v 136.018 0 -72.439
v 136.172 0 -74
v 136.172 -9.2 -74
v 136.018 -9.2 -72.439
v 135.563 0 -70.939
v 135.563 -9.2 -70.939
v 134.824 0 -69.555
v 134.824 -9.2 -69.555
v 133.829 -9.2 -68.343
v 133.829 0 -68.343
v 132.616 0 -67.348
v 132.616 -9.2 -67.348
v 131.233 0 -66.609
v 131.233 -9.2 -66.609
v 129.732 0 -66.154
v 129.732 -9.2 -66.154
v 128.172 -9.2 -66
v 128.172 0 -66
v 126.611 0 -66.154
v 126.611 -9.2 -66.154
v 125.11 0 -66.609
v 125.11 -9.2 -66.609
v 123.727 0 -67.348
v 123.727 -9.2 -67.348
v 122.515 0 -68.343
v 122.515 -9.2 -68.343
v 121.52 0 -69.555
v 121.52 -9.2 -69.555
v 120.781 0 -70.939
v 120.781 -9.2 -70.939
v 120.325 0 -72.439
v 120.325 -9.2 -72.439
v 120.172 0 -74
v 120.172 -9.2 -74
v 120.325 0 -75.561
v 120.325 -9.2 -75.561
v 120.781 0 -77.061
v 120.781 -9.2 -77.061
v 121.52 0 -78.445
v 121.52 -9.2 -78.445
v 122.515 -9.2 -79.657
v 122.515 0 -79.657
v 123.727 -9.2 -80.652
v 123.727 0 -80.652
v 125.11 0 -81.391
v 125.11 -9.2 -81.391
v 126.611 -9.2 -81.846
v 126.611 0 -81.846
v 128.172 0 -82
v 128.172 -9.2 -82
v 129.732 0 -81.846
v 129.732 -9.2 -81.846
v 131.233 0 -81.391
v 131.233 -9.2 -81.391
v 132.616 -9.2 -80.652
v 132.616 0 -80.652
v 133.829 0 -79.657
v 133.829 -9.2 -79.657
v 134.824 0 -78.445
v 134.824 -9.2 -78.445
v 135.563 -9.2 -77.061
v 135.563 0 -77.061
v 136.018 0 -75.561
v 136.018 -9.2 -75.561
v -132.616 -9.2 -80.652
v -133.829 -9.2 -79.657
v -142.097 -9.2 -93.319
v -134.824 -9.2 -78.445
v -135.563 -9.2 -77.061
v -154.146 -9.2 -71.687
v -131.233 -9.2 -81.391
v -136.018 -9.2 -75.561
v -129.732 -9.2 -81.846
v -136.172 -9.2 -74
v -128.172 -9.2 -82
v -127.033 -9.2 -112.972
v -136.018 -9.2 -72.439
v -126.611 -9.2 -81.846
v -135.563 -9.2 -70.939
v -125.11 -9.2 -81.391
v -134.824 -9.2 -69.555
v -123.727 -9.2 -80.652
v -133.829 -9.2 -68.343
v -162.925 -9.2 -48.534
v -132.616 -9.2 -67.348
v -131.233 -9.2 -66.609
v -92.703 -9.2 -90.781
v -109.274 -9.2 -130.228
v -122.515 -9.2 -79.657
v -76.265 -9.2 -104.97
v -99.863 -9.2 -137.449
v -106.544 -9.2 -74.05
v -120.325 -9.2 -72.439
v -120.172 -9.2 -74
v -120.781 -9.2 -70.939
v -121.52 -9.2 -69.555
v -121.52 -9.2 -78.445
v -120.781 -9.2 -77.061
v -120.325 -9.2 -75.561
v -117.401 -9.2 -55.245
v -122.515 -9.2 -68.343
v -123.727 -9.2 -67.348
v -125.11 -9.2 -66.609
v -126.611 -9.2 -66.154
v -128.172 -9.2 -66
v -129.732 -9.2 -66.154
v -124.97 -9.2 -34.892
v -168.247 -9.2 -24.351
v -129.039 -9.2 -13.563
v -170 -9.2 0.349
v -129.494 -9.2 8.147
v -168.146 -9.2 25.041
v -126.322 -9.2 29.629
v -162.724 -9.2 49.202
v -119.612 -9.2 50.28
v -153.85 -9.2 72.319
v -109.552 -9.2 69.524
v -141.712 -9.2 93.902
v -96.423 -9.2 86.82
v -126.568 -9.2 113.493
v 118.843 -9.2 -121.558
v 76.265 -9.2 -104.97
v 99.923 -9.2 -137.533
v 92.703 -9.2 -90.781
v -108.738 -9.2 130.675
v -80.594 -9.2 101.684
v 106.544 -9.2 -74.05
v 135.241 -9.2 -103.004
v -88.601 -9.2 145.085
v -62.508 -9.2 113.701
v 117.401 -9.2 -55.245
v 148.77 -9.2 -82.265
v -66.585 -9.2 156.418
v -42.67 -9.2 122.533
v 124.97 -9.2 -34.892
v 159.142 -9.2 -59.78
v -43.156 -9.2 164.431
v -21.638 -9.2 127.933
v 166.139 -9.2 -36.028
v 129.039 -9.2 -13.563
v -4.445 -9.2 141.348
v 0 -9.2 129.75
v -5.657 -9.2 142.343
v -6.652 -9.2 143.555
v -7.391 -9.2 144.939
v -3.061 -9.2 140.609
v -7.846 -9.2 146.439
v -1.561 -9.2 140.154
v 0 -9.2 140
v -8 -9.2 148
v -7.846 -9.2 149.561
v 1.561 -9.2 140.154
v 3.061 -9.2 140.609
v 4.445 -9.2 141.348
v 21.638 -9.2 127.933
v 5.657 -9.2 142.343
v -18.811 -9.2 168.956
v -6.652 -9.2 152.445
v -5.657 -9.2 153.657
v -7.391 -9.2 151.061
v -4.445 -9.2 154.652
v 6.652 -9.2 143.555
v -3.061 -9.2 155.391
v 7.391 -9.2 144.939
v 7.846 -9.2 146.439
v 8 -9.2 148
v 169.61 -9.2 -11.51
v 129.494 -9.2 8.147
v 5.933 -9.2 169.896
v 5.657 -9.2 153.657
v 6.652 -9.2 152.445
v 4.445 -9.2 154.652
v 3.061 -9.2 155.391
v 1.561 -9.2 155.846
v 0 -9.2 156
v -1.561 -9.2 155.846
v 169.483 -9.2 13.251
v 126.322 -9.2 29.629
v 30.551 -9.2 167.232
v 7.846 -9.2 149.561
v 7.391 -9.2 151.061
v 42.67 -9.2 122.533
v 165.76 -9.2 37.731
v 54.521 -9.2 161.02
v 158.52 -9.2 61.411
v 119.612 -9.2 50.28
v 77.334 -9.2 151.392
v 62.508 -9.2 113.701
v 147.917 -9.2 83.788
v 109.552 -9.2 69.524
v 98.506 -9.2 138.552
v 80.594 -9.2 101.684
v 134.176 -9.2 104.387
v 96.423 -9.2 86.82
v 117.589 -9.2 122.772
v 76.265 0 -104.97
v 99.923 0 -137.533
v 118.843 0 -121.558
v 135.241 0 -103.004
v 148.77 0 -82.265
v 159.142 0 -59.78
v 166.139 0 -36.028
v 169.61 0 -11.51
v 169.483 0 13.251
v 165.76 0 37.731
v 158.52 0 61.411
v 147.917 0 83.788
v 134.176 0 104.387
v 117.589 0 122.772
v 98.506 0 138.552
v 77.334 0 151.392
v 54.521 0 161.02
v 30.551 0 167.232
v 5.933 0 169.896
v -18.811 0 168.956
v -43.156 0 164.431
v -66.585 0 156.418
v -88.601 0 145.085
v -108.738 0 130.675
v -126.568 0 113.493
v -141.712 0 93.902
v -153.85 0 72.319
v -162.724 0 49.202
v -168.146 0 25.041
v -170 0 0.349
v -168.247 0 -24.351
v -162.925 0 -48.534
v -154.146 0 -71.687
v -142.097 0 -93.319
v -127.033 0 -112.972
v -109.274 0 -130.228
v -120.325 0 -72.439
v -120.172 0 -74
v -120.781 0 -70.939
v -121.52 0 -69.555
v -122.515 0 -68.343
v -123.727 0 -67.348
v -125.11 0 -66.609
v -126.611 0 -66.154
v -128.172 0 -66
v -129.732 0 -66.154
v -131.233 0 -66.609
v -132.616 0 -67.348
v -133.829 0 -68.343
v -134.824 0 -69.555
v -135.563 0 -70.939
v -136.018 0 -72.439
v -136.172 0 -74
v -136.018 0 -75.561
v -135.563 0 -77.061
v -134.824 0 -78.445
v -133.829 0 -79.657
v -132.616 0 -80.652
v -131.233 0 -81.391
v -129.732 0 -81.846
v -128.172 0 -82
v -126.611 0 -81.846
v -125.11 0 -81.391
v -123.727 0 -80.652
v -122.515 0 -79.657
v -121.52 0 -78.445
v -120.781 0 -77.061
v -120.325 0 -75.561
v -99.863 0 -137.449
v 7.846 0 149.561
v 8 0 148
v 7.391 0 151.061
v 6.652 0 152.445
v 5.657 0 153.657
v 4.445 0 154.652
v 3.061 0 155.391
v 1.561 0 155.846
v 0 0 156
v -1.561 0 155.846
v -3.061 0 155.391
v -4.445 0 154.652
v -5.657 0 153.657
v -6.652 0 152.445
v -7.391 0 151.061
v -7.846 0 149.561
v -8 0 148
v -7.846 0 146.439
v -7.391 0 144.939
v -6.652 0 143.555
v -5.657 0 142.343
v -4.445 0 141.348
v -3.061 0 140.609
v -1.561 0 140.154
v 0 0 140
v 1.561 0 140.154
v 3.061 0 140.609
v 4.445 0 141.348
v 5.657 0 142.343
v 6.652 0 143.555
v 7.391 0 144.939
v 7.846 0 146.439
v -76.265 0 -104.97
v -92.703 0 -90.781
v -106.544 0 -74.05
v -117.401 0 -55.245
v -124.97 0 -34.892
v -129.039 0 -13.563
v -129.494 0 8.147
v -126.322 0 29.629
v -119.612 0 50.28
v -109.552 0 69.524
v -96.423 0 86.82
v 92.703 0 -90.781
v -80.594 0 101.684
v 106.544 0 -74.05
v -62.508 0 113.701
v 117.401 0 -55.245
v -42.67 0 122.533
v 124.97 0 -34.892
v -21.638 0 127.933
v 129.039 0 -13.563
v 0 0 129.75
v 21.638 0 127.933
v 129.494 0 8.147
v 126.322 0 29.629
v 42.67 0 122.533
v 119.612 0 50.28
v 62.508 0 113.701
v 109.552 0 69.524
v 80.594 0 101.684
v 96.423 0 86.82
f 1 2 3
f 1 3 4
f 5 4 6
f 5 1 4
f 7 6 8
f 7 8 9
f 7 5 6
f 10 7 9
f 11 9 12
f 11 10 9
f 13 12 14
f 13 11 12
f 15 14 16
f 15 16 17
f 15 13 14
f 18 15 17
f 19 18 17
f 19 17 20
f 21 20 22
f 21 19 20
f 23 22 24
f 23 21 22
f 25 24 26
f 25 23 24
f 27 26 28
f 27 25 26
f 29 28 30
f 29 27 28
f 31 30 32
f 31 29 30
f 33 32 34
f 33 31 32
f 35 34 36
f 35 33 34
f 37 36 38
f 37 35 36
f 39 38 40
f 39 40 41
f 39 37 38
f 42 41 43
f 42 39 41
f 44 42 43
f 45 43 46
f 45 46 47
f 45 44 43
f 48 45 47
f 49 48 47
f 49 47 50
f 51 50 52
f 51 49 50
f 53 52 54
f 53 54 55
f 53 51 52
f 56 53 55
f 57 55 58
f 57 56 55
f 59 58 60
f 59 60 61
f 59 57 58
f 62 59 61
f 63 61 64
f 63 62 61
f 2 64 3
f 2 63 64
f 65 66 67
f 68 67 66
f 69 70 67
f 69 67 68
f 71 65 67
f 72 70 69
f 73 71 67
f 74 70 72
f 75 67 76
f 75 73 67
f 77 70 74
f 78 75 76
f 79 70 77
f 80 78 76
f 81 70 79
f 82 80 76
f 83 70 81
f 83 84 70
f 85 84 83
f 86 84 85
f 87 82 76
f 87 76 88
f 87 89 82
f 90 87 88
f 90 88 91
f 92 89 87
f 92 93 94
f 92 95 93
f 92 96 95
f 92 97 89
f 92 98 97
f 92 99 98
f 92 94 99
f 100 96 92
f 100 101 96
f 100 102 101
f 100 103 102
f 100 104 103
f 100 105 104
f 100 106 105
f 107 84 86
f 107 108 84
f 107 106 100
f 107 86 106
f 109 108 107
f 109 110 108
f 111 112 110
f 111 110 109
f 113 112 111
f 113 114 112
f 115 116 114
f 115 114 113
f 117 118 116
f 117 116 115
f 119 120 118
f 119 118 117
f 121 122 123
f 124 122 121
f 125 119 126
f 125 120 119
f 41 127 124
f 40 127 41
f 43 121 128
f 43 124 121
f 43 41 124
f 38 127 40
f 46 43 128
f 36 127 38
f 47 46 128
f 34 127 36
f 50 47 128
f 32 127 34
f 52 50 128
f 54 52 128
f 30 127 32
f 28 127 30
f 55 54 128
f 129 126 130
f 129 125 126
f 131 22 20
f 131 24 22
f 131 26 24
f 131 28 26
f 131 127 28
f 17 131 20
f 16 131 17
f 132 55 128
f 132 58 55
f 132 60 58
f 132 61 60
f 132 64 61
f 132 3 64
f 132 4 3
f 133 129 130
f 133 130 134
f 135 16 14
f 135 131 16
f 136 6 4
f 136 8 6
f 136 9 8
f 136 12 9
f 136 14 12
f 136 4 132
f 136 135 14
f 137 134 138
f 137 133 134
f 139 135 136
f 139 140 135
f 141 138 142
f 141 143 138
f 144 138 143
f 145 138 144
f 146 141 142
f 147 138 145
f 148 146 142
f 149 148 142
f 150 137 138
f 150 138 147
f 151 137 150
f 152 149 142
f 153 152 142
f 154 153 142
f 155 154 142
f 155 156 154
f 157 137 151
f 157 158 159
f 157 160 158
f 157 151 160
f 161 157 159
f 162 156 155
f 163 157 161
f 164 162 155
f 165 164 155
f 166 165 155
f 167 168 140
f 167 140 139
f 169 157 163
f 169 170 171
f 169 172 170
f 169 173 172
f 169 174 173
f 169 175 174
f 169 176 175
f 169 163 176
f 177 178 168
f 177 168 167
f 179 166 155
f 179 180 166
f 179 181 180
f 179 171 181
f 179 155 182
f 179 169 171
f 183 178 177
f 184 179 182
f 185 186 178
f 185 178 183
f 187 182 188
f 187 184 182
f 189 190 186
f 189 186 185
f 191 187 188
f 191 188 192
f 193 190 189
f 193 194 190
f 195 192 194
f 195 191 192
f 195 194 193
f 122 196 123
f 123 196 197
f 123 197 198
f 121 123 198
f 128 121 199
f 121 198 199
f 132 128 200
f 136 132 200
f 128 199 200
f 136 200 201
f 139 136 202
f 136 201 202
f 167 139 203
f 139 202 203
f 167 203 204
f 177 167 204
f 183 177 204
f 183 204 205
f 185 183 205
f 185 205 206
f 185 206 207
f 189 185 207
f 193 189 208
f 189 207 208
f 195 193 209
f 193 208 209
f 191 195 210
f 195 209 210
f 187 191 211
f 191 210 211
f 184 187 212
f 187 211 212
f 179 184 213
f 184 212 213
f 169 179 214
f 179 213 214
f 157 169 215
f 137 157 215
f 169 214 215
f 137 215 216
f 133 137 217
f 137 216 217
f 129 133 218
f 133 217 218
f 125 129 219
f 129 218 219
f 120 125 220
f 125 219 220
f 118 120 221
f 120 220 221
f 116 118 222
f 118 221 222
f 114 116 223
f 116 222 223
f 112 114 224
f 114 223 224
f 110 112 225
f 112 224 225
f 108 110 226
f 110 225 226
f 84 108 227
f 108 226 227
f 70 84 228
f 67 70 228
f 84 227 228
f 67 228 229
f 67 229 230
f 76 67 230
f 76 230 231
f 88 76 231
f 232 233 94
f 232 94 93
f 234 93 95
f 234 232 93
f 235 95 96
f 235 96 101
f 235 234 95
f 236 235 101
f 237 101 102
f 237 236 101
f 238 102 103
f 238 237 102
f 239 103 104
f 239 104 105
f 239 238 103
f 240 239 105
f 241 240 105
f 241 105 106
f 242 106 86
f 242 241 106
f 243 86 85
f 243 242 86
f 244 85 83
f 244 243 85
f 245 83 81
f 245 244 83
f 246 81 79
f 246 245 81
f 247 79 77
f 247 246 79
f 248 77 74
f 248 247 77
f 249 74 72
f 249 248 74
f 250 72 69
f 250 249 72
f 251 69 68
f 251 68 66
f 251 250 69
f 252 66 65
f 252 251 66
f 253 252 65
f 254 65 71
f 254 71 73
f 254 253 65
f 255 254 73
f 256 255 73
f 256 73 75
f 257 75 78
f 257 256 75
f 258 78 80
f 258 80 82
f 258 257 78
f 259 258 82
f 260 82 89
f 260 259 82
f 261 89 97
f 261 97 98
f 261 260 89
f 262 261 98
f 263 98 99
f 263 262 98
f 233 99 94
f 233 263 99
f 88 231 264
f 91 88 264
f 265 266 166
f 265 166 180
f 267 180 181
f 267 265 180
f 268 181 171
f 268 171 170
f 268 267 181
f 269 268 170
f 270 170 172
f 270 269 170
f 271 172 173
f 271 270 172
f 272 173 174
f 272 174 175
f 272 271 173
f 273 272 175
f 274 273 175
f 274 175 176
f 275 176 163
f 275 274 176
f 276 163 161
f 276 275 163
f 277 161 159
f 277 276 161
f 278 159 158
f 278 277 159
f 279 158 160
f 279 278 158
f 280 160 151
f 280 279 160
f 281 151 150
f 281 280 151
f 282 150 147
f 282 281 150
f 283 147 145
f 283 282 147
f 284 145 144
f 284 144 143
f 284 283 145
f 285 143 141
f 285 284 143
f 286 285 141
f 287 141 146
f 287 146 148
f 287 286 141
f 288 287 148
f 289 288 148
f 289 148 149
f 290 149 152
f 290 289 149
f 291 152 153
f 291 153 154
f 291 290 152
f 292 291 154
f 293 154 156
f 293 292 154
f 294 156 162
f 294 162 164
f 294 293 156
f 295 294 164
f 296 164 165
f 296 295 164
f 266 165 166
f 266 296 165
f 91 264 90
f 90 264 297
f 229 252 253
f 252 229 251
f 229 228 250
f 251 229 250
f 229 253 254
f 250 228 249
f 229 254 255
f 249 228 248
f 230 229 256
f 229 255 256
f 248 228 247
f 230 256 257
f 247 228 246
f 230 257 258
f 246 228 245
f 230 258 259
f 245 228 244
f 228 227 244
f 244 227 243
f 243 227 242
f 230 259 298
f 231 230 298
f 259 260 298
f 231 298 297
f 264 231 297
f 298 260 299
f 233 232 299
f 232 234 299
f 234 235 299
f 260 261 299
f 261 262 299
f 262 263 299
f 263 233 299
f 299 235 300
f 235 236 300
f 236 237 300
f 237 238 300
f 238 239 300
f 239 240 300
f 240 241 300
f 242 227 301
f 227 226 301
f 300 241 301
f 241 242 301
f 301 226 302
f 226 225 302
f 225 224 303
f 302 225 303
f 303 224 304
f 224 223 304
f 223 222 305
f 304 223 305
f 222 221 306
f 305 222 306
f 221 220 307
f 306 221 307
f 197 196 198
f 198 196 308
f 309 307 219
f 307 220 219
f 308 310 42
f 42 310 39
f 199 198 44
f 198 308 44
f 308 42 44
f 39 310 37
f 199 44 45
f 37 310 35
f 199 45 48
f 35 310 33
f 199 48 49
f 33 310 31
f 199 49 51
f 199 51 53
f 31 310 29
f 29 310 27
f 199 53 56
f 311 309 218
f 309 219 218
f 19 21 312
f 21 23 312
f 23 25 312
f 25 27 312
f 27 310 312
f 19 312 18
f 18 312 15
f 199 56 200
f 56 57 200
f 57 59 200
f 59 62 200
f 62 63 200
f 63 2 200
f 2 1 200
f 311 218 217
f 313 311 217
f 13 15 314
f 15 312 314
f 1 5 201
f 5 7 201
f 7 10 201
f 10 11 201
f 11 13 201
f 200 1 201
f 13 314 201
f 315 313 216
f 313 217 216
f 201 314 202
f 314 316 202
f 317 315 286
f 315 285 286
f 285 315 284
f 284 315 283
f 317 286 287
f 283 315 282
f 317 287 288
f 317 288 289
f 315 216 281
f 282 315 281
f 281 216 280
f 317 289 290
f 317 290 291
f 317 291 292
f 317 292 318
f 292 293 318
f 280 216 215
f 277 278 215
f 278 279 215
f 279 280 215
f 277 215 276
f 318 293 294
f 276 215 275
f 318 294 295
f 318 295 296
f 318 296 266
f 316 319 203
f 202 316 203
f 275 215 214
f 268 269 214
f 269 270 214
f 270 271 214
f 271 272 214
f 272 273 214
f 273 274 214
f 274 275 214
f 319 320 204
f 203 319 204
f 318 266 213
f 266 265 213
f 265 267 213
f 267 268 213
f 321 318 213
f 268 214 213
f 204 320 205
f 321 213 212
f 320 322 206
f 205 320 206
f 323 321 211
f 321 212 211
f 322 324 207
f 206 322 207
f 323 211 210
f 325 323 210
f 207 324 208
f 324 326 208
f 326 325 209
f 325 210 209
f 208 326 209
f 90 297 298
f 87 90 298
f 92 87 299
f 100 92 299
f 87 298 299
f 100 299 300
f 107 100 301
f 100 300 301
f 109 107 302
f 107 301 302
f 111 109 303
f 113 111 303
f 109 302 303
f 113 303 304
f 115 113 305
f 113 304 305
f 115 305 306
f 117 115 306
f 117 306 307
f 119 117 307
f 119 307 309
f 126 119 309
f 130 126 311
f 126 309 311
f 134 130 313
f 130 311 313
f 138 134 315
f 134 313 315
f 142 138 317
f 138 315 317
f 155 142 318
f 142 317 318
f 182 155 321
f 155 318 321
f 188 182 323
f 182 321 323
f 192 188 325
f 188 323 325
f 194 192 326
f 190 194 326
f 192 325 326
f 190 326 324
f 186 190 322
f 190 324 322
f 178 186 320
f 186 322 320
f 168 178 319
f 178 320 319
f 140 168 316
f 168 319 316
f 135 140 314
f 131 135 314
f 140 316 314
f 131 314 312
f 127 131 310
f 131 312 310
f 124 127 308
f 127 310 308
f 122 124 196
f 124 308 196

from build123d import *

# Parameters (mm, degrees)
F0_R     = 8
F1_DEPTH = 9.2


with BuildPart() as f1:
    # F0 (on Front) → F1 (new body)
    with BuildSketch(Plane.XZ):
        with BuildLine():
            Line((76.2651364849, -104.9699550201), (99.9234928897, -137.5328890437))
            ThreePointArc((99.9234928897, -137.5328890437), (5.9329144394, 169.8964405932), (-109.2738936467, -130.2275553302))
            Line((-109.2738936467, -130.2275553302), (-99.8627523041, -137.4492867999))
            Line((-99.8627523041, -137.4492867999), (-76.2651364849, -104.9699550201))
            ThreePointArc((-76.2651364849, -104.9699550201), (-10.7051286377, 129.3076282392), (92.4890377243, -90.9991230773))
            ThreePointArc((92.4890377243, -90.9991230773), (84.6657478828, -98.3197520107), (76.2651364849, -104.9699550201))
        make_face()
        with Locations((-128.1717597601, -74)):
            Circle(F0_R, mode=Mode.SUBTRACT)
        with Locations((128.1717597601, -74)):
            Circle(F0_R, mode=Mode.SUBTRACT)
        with Locations((0, 148)):
            Circle(F0_R, mode=Mode.SUBTRACT)
    extrude(amount=F1_DEPTH)


solid = f1.part
